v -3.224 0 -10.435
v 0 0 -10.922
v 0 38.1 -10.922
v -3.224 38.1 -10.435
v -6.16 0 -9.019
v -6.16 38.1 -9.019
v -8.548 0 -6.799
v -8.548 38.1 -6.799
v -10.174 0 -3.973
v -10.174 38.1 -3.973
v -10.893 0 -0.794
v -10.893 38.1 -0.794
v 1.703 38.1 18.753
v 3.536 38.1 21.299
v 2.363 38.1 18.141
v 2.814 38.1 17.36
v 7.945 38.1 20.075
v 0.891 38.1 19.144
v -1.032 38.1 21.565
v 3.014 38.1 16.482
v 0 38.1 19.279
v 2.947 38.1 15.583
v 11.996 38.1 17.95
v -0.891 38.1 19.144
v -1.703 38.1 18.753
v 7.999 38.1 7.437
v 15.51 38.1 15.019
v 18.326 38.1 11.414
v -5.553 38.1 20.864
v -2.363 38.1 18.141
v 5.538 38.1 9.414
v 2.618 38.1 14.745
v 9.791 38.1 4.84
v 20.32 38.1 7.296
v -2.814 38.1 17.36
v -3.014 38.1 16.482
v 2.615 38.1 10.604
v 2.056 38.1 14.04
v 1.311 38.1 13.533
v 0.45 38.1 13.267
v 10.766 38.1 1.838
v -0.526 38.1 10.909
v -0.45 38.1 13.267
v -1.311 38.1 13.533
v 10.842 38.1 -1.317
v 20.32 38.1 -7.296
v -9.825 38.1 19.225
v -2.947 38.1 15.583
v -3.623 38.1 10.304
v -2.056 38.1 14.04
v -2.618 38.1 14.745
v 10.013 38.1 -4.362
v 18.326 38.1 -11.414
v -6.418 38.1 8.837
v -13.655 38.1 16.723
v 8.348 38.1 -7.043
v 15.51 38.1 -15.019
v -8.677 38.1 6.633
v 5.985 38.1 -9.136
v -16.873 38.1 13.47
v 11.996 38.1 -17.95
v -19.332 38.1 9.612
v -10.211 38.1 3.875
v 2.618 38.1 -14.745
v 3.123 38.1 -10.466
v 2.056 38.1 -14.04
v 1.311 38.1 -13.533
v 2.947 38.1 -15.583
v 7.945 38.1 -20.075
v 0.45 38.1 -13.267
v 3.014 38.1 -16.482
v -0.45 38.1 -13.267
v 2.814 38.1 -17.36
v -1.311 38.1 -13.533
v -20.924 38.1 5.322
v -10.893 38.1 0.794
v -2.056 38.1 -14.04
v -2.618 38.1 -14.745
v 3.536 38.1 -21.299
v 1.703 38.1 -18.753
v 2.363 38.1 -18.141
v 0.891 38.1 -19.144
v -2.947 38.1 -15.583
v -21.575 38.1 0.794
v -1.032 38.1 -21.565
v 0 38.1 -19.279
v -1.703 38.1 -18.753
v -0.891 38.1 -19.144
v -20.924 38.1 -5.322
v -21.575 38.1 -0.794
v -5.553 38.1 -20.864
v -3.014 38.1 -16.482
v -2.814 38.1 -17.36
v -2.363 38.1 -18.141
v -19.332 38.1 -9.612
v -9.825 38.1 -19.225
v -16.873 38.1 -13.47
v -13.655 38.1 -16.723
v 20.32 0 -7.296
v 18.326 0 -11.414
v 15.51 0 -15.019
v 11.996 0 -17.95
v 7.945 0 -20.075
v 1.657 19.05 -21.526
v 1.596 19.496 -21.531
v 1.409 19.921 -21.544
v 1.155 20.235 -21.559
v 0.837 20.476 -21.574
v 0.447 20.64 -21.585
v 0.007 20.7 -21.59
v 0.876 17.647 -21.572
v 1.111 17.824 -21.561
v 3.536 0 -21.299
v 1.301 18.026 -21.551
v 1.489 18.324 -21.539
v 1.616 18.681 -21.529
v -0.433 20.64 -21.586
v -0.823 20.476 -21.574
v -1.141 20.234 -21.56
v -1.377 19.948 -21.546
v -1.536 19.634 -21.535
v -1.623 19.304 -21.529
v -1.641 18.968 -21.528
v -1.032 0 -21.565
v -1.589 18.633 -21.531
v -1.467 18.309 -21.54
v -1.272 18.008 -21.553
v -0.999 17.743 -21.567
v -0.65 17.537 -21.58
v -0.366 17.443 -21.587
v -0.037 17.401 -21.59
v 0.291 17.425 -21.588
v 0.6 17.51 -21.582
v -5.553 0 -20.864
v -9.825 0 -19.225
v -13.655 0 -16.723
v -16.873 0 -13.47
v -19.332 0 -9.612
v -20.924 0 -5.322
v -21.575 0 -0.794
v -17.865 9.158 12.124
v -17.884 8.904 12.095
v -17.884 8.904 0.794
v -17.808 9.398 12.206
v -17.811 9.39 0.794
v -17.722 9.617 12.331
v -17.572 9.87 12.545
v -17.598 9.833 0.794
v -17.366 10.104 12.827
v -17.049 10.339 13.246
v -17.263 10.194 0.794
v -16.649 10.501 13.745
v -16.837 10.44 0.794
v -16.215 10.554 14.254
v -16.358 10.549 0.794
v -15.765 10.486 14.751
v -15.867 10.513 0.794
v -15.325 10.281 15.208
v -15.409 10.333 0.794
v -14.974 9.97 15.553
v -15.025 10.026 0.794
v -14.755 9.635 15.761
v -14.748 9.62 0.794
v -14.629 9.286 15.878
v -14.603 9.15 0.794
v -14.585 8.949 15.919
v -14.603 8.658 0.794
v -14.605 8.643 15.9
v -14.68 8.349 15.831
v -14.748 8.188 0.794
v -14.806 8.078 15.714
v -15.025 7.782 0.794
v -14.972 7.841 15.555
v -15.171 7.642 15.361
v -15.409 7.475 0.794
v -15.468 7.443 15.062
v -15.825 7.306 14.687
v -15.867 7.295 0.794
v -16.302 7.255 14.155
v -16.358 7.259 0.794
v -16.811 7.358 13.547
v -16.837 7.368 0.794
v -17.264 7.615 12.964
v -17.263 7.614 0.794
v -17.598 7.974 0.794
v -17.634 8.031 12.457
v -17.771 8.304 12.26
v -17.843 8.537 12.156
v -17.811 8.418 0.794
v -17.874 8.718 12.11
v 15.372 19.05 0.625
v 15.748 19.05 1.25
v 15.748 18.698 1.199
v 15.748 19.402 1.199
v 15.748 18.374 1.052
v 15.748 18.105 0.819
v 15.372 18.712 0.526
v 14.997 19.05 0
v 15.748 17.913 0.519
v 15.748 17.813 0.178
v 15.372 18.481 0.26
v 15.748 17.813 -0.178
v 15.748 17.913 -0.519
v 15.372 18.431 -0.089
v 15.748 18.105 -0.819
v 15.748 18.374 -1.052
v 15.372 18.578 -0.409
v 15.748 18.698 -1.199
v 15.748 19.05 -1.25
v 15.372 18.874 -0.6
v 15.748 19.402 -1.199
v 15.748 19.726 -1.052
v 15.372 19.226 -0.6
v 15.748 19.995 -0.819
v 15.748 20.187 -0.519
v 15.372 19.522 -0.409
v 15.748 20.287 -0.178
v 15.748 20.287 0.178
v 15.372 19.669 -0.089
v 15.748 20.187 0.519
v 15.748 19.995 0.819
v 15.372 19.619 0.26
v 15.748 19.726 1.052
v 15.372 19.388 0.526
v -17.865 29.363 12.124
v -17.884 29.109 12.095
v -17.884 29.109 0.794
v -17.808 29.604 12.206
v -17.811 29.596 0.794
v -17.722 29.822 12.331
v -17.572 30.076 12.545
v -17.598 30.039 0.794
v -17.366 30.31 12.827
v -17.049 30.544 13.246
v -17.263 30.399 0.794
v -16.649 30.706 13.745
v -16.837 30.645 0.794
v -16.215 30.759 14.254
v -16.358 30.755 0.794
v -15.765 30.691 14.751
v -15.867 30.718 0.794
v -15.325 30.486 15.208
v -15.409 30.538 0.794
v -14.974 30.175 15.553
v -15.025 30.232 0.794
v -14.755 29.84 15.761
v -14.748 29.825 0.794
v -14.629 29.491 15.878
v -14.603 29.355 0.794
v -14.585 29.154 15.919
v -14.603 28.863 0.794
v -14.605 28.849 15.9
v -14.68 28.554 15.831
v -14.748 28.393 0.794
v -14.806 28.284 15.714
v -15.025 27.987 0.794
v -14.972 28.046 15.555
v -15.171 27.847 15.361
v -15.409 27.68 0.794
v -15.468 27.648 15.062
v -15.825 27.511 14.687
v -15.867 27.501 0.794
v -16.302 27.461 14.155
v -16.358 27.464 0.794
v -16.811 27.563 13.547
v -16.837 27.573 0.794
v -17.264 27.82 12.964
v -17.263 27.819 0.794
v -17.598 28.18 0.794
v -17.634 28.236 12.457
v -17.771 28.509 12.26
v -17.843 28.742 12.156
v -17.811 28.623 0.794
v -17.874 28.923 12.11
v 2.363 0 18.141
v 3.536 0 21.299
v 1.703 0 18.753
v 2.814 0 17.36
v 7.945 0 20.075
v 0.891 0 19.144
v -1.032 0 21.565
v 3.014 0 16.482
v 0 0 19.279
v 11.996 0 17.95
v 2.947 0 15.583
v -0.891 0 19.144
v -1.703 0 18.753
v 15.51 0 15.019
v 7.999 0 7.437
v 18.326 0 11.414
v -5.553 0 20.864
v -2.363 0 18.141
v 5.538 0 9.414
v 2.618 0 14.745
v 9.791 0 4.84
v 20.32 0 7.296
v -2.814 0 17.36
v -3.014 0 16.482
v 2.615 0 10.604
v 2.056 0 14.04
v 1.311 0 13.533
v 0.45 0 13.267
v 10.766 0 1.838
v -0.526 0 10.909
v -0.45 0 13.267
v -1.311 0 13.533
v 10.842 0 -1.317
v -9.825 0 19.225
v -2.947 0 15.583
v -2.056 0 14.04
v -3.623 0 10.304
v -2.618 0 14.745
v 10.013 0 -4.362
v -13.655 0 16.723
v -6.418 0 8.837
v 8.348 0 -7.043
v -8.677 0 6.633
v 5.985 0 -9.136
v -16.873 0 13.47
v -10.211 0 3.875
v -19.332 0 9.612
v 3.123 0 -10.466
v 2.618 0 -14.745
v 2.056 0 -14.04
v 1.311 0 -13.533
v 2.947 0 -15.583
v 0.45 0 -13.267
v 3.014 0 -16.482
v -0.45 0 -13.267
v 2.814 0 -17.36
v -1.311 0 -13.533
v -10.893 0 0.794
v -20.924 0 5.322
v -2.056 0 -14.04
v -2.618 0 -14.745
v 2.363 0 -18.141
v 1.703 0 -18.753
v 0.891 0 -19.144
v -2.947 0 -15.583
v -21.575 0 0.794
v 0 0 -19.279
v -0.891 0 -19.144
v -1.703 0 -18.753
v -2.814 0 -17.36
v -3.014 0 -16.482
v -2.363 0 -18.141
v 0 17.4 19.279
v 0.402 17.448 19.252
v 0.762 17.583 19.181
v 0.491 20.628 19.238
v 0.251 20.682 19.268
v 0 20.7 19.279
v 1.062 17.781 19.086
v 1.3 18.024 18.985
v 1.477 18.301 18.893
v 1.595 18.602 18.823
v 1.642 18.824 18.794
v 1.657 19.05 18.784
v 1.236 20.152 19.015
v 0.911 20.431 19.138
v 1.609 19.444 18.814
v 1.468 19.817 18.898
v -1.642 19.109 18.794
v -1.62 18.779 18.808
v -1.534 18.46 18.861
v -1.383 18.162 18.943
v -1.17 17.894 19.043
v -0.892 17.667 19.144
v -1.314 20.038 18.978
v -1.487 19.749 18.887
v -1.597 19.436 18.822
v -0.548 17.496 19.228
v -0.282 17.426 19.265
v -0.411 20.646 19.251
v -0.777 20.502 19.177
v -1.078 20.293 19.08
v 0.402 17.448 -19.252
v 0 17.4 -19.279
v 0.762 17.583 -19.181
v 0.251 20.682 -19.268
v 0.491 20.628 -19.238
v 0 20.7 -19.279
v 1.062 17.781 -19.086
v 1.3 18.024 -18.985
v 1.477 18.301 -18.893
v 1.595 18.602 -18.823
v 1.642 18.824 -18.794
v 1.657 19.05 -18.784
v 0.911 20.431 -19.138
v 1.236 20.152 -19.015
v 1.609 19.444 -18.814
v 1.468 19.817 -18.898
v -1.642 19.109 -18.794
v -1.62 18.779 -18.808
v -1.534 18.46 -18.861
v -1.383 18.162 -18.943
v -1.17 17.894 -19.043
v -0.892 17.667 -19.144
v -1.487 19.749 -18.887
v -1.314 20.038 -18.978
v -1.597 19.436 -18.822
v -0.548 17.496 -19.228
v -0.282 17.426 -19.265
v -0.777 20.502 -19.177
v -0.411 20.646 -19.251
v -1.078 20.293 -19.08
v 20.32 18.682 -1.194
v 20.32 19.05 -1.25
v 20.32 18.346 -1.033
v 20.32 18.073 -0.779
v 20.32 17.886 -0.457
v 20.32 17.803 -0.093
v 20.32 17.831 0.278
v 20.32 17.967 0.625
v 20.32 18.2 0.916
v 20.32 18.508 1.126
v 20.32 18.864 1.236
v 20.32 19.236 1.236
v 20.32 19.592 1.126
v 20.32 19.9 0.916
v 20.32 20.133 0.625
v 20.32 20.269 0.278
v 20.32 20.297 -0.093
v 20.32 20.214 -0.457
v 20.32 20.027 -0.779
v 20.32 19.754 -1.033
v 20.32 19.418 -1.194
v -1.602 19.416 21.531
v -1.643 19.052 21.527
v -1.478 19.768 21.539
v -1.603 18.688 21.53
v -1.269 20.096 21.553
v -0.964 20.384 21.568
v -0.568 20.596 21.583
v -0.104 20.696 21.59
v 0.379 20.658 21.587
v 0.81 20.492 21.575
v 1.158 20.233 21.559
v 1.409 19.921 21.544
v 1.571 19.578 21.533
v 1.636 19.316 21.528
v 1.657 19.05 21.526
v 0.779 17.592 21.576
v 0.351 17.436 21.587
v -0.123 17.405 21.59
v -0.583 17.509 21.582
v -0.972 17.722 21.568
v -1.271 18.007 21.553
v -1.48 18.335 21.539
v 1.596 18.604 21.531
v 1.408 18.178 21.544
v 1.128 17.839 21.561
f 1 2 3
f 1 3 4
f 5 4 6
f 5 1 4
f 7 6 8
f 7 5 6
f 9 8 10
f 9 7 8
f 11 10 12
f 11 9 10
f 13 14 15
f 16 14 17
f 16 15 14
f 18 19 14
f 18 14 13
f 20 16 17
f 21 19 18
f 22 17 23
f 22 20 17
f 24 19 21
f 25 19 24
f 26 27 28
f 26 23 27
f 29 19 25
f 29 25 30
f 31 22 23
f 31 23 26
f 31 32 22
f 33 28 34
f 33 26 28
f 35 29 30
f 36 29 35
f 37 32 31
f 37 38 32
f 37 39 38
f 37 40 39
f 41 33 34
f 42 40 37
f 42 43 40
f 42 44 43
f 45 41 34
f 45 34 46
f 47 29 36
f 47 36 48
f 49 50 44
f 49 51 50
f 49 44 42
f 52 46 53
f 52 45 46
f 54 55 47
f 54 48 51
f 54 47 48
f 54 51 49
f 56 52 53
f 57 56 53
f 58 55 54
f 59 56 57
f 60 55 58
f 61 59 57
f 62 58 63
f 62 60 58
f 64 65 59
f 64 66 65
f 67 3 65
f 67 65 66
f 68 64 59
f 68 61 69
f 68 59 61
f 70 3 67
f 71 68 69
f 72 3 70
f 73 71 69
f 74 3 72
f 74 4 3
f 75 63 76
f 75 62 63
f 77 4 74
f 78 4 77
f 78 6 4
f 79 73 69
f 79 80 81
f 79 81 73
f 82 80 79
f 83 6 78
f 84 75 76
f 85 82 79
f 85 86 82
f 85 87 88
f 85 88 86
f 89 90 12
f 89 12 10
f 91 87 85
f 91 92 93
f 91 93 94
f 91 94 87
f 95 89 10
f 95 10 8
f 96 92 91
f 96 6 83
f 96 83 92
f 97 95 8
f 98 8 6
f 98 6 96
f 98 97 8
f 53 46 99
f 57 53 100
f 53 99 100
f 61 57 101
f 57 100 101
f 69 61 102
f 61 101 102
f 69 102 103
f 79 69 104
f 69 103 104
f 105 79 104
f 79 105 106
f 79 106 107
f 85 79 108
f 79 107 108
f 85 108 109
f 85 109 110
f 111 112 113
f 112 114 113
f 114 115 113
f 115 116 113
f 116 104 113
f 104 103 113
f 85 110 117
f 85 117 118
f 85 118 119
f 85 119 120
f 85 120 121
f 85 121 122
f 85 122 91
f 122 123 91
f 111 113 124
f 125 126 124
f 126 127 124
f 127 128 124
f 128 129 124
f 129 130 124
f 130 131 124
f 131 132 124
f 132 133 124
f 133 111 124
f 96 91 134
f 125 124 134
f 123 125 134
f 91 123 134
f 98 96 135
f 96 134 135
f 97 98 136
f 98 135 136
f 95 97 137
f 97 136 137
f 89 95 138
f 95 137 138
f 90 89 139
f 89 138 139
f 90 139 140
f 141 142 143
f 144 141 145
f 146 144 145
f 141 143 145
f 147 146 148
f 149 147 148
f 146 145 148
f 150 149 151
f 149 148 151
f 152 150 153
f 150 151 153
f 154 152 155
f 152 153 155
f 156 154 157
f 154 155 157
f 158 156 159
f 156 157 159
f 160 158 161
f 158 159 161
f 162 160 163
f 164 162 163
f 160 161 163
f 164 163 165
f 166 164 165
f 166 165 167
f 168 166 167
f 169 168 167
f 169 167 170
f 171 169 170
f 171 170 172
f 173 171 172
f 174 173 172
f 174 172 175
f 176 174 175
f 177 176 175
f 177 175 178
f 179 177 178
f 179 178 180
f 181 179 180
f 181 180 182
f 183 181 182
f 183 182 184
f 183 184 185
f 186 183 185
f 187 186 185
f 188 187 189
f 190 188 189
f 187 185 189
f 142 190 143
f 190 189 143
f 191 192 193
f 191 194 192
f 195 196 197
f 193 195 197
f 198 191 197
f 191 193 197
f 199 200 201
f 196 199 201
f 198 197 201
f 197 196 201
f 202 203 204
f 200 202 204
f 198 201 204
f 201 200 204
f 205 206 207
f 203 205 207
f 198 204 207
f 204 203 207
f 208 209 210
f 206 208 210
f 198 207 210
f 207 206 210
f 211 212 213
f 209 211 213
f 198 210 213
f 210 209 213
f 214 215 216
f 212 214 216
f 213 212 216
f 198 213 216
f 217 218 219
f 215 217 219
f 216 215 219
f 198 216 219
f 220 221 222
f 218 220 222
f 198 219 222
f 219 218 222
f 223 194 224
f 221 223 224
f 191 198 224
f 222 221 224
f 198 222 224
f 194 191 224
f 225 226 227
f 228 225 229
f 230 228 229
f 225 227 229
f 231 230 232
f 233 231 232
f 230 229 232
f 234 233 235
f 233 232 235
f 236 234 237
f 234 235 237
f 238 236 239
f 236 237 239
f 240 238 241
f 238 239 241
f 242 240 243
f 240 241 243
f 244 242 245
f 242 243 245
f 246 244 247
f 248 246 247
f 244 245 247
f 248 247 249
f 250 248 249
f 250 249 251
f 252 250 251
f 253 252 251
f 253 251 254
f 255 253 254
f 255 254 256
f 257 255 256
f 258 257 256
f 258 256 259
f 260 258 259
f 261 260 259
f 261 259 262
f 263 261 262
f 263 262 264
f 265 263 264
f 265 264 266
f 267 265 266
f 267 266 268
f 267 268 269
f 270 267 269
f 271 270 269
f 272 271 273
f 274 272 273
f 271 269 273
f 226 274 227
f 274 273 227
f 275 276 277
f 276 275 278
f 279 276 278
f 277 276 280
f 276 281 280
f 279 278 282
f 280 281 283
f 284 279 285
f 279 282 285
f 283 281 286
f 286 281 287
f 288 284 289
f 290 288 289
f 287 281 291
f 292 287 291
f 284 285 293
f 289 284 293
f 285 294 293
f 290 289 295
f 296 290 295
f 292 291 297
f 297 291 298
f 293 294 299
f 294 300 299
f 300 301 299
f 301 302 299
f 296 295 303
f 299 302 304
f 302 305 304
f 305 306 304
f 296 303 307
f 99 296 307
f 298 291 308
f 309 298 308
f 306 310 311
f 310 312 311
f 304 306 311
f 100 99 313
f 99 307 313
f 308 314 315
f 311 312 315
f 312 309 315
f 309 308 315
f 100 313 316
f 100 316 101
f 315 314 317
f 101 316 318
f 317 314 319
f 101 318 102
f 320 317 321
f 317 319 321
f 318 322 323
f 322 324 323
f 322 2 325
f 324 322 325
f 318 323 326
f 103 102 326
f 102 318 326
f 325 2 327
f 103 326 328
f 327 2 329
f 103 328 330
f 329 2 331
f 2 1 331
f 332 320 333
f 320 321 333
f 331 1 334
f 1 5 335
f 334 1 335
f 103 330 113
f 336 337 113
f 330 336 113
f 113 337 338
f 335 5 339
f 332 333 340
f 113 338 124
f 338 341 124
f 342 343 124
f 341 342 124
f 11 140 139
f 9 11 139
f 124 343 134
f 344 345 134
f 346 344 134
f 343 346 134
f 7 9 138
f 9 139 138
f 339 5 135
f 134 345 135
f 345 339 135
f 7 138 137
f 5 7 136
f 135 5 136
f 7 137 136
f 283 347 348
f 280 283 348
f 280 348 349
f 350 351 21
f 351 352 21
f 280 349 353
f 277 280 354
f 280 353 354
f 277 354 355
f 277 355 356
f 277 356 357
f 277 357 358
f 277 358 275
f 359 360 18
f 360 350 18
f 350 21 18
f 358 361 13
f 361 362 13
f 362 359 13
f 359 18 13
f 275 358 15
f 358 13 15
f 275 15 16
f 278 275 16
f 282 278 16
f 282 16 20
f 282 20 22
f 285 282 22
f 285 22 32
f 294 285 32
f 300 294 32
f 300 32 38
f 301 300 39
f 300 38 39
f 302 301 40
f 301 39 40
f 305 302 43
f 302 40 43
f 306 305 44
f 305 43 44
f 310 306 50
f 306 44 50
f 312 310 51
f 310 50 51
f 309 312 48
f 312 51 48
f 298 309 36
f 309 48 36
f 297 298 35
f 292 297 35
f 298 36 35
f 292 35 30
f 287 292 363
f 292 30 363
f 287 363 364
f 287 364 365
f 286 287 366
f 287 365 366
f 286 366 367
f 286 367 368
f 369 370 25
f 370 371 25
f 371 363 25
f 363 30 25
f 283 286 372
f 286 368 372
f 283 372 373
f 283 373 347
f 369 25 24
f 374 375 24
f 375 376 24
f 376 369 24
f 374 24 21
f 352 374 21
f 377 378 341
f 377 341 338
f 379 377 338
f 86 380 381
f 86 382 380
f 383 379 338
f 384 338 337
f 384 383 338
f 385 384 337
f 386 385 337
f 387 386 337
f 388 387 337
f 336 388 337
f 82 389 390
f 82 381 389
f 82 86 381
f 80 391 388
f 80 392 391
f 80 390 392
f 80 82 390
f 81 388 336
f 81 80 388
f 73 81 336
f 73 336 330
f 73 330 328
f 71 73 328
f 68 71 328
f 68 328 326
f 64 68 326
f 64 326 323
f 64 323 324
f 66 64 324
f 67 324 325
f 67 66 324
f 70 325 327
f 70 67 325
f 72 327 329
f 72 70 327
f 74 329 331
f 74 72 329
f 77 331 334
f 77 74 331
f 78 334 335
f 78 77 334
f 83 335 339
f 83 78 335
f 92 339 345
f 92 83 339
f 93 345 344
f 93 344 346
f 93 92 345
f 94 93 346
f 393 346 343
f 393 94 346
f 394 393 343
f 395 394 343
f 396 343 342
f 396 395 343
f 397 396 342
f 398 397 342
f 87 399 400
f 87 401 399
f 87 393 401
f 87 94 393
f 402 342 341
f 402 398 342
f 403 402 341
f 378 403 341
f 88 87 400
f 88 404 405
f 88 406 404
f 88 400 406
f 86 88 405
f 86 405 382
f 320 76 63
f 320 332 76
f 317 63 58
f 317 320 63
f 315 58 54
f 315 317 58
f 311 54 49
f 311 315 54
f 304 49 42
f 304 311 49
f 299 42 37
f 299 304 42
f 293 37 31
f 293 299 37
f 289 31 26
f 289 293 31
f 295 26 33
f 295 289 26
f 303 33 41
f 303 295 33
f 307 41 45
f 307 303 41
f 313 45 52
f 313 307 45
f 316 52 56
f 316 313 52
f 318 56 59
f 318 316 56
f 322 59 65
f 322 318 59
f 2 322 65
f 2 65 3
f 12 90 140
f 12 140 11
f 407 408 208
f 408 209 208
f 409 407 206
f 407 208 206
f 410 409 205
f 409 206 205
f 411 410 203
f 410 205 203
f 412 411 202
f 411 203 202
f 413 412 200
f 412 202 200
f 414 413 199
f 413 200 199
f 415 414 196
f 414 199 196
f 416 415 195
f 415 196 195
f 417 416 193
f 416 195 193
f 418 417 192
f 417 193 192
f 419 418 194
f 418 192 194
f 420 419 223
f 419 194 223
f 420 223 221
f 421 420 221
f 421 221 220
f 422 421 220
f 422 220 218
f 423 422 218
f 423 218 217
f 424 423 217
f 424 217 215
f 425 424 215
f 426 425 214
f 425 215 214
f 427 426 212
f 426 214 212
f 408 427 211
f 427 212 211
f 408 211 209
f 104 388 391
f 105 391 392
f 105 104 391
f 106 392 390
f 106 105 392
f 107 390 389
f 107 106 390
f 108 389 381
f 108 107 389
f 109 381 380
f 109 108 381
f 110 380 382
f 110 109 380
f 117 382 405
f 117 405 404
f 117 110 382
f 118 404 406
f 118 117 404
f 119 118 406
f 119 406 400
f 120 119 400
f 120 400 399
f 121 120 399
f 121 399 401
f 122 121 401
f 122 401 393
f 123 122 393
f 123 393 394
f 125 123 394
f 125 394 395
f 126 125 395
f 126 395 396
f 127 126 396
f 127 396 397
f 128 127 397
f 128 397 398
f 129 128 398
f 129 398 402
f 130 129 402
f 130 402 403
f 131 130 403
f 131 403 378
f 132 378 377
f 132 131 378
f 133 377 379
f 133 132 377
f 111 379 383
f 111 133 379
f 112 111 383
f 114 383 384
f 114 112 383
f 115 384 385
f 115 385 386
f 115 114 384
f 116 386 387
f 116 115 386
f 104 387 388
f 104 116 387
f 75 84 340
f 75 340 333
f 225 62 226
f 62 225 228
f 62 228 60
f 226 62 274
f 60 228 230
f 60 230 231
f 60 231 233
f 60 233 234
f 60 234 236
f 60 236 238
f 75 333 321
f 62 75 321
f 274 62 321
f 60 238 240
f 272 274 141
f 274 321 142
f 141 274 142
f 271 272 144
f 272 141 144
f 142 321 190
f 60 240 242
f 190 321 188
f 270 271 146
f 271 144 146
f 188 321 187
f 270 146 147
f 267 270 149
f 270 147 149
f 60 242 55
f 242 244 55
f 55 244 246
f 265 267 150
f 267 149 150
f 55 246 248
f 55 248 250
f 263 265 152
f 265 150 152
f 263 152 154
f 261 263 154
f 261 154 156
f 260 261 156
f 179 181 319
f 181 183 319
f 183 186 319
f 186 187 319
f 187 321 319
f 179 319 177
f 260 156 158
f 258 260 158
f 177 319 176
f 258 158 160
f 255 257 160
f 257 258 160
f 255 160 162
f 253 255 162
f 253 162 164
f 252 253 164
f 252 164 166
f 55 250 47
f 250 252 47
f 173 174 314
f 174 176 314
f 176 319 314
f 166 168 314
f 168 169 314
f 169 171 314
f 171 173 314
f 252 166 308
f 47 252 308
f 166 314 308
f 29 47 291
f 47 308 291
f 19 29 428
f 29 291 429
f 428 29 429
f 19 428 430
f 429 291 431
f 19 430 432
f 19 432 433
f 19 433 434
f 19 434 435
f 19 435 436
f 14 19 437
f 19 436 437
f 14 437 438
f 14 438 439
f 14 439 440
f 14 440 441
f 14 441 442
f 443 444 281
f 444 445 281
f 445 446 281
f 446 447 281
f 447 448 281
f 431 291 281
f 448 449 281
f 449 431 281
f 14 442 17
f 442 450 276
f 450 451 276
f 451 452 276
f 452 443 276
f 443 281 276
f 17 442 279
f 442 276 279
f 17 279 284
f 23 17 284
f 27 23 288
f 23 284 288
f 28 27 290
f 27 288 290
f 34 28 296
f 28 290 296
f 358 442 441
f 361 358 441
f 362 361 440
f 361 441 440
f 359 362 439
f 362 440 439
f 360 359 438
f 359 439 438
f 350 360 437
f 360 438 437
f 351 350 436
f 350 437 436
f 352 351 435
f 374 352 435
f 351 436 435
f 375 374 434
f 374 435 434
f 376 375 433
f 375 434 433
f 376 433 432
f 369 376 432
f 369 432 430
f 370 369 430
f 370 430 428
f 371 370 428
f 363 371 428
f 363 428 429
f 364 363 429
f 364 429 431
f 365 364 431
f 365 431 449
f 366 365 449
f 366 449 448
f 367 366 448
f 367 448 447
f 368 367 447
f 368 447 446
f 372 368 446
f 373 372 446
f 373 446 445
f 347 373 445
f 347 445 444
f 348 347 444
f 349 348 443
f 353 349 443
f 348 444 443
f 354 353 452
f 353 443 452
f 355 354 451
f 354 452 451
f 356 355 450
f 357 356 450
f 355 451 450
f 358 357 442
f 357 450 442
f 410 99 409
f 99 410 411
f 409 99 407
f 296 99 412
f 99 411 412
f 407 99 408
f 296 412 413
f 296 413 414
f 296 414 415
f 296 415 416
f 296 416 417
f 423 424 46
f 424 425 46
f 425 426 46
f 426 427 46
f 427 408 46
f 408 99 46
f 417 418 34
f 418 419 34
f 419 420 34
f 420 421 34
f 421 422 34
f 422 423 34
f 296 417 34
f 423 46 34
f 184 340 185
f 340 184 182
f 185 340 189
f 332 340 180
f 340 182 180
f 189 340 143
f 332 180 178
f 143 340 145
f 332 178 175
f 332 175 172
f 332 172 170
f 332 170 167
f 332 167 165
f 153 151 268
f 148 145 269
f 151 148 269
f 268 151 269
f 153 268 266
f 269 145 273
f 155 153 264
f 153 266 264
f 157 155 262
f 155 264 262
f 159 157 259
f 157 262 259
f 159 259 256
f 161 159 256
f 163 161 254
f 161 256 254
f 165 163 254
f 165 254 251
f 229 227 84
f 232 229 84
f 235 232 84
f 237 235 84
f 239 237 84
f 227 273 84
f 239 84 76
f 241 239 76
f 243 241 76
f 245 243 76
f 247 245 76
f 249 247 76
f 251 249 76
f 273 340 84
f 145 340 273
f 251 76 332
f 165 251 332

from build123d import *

# Parameters (mm, degrees)
SKETCH2_R                        = 21.59
SKETCH2_R_2                      = 10.922
BOSS_EXTRUDE1_DEPTH              = 38.1
CUT_EXTRUDE1_REACH               = 50.825
SKETCH3_W                        = 21.59
SKETCH3_H                        = 1.5875
CUT_EXTRUDE2_REACH               = 50.825
SKETCH4_R                        = 3.0226
TAP_DRILL_FOR_M4X0_7_TAP1_REACH  = 54.717
TAP_DRILL_FOR_M4X0_7_TAP1_BORE_R = 1.65
CUT_EXTRUDE5_REACH               = 63.5
CUT_EXTRUDE5_END_RADIUS          = 3.0226
SKETCH11_R                       = 1.65
CUT_EXTRUDE6_REACH               = 50.825
TAP_DRILL_FOR_M3X0_5_TAP2_D      = 2.5
TAP_DRILL_FOR_M3X0_5_TAP2_DEPTH  = 4.572
TAP_DRILL_FOR_M3X0_5_TAP2_TIP    = 0.751075774


with BuildPart() as part:
    # Sketch2 → Boss-Extrude1 (new body)
    with BuildSketch(Plane(origin=(0, 0, 0), x_dir=(1, 0, 0), z_dir=(0, 1, 0))):
        with Locations(Location((0, 0, 0), (0, 0, 90))):
            Circle(SKETCH2_R)
        with Locations(Location((0, 0, 0), (0, 0, 90))):
            Circle(SKETCH2_R_2, mode=Mode.SUBTRACT)
    extrude(amount=BOSS_EXTRUDE1_DEPTH)

    # Sketch3 → Cut-Extrude1 (cut, up to next)
    with BuildSketch(Plane(origin=(0, 38.1, 0), x_dir=(1, 0, 0), z_dir=(0, 1, 0)), mode=Mode.PRIVATE) as cut_extrude1_sk1:
        with Locations((-10.795, 0)):
            Rectangle(SKETCH3_W, SKETCH3_H)
    cut_extrude1_tool1 = extrude(cut_extrude1_sk1.sketch, amount=-CUT_EXTRUDE1_REACH, mode=Mode.PRIVATE) & part.part
    add(cut_extrude1_tool1.solids().sort_by_distance((-10.795, 38.1, 0))[0], mode=Mode.SUBTRACT)

    # Sketch4 → Cut-Extrude2 (cut, up to next)
    with BuildSketch(Plane(origin=(0, 38.1, 0), x_dir=(1, 0, 0), z_dir=(0, 1, 0)), mode=Mode.PRIVATE) as cut_extrude2_sk1:
        with Locations(Location((0, -16.256, 0), (0, 0, 270))):
            Circle(SKETCH4_R)
    cut_extrude2_tool1 = extrude(cut_extrude2_sk1.sketch, amount=-CUT_EXTRUDE2_REACH, mode=Mode.PRIVATE) & part.part
    cut_extrude2 = cut_extrude2_tool1.solids().sort_by_distance((0, 38.1, 16.256))[0]
    add(cut_extrude2, mode=Mode.SUBTRACT)

    # Tap Drill for M4x0.7 Tap1 bore (on position points) → Tap Drill for M4x0.7 Tap1 (cut, up to next)
    with BuildSketch(Plane(origin=(-16.234261615, 29.109235595, 0.79375), x_dir=(-1, 0, 0), z_dir=(0, 0, -1)), mode=Mode.PRIVATE) as tap_drill_for_m4x0_7_tap1_sk1:
        Circle(TAP_DRILL_FOR_M4X0_7_TAP1_BORE_R)
    tap_drill_for_m4x0_7_tap1_tool1 = extrude(tap_drill_for_m4x0_7_tap1_sk1.sketch, amount=-TAP_DRILL_FOR_M4X0_7_TAP1_REACH, mode=Mode.PRIVATE) & part.part
    # Tap Drill for M4x0.7 Tap1 bore (on position points) → Tap Drill for M4x0.7 Tap1 (cut, up to next)
    with BuildSketch(Plane(origin=(-16.234261615, 29.109235595, 0.79375), x_dir=(-1, 0, 0), z_dir=(0, 0, -1)), mode=Mode.PRIVATE) as tap_drill_for_m4x0_7_tap1_sk2:
        with Locations((0, -20.205281104)):
            Circle(TAP_DRILL_FOR_M4X0_7_TAP1_BORE_R)
    tap_drill_for_m4x0_7_tap1_tool2 = extrude(tap_drill_for_m4x0_7_tap1_sk2.sketch, amount=-TAP_DRILL_FOR_M4X0_7_TAP1_REACH, mode=Mode.PRIVATE) & part.part
    add(tap_drill_for_m4x0_7_tap1_tool1.solids().sort_by_distance((-16.234262, 29.109236, 0.79375))[0], mode=Mode.SUBTRACT)
    add(tap_drill_for_m4x0_7_tap1_tool2.solids().sort_by_distance((-16.234262, 8.903954, 0.79375))[0], mode=Mode.SUBTRACT)

    # Cut-Extrude5: up to this cylinder (the profile starts outside it)
    cut_extrude5_end = Plane(origin=(0, 19.05, 16.256), z_dir=(0, 1, 0)) * Cylinder(CUT_EXTRUDE5_END_RADIUS, 134.0452, mode=Mode.PRIVATE)
    # Sketch11 → Cut-Extrude5 (cut, up to the surface)
    with BuildSketch(Plane.XY.offset(21.59), mode=Mode.PRIVATE) as cut_extrude5_sk1:
        with Locations((0.007297963, 19.05)):
            Circle(SKETCH11_R)
    cut_extrude5_tool1 = extrude(cut_extrude5_sk1.sketch, amount=-CUT_EXTRUDE5_REACH, mode=Mode.PRIVATE) - cut_extrude5_end
    cut_extrude5 = cut_extrude5_tool1.solids().sort_by_distance((0.007298, 19.05, 21.59))[0]
    add(cut_extrude5, mode=Mode.SUBTRACT)

    # Mirror1: Cut-Extrude2, Cut-Extrude5 across plane
    add(cut_extrude2.mirror(Plane.XY), mode=Mode.SUBTRACT)
    add(cut_extrude5.mirror(Plane.XY), mode=Mode.SUBTRACT)

    # Sketch12 → Cut-Extrude6 (cut, up to next)
    with BuildSketch(Plane(origin=(0, 38.1, 0), x_dir=(1, 0, 0), z_dir=(0, 1, 0)), mode=Mode.PRIVATE) as cut_extrude6_sk1:
        with BuildLine():
            Line((20.32, 7.295594561), (20.32, -7.295594561))
            ThreePointArc((20.32, -7.295594561), (21.59, 0), (20.32, 7.295594561))
        make_face()
    cut_extrude6_tool1 = extrude(cut_extrude6_sk1.sketch, amount=-CUT_EXTRUDE6_REACH, mode=Mode.PRIVATE) & part.part
    add(cut_extrude6_tool1.solids().sort_by_distance((20.829303, 38.1, 0))[0], mode=Mode.SUBTRACT)

    # Tap Drill for M3x0.5 Tap2
    with Locations(Plane(origin=(20.32, 19.05, 0), x_dir=(0, 0, 1), z_dir=(1, 0, 0))):
        with Locations((0, 0)):
            Hole(TAP_DRILL_FOR_M3X0_5_TAP2_D / 2, depth=TAP_DRILL_FOR_M3X0_5_TAP2_DEPTH)
            with Locations((0, 0, -(TAP_DRILL_FOR_M3X0_5_TAP2_DEPTH + TAP_DRILL_FOR_M3X0_5_TAP2_TIP / 2))):  # 118° drill point
                Cone(0, TAP_DRILL_FOR_M3X0_5_TAP2_D / 2, TAP_DRILL_FOR_M3X0_5_TAP2_TIP, mode=Mode.SUBTRACT)


solid = part.part
